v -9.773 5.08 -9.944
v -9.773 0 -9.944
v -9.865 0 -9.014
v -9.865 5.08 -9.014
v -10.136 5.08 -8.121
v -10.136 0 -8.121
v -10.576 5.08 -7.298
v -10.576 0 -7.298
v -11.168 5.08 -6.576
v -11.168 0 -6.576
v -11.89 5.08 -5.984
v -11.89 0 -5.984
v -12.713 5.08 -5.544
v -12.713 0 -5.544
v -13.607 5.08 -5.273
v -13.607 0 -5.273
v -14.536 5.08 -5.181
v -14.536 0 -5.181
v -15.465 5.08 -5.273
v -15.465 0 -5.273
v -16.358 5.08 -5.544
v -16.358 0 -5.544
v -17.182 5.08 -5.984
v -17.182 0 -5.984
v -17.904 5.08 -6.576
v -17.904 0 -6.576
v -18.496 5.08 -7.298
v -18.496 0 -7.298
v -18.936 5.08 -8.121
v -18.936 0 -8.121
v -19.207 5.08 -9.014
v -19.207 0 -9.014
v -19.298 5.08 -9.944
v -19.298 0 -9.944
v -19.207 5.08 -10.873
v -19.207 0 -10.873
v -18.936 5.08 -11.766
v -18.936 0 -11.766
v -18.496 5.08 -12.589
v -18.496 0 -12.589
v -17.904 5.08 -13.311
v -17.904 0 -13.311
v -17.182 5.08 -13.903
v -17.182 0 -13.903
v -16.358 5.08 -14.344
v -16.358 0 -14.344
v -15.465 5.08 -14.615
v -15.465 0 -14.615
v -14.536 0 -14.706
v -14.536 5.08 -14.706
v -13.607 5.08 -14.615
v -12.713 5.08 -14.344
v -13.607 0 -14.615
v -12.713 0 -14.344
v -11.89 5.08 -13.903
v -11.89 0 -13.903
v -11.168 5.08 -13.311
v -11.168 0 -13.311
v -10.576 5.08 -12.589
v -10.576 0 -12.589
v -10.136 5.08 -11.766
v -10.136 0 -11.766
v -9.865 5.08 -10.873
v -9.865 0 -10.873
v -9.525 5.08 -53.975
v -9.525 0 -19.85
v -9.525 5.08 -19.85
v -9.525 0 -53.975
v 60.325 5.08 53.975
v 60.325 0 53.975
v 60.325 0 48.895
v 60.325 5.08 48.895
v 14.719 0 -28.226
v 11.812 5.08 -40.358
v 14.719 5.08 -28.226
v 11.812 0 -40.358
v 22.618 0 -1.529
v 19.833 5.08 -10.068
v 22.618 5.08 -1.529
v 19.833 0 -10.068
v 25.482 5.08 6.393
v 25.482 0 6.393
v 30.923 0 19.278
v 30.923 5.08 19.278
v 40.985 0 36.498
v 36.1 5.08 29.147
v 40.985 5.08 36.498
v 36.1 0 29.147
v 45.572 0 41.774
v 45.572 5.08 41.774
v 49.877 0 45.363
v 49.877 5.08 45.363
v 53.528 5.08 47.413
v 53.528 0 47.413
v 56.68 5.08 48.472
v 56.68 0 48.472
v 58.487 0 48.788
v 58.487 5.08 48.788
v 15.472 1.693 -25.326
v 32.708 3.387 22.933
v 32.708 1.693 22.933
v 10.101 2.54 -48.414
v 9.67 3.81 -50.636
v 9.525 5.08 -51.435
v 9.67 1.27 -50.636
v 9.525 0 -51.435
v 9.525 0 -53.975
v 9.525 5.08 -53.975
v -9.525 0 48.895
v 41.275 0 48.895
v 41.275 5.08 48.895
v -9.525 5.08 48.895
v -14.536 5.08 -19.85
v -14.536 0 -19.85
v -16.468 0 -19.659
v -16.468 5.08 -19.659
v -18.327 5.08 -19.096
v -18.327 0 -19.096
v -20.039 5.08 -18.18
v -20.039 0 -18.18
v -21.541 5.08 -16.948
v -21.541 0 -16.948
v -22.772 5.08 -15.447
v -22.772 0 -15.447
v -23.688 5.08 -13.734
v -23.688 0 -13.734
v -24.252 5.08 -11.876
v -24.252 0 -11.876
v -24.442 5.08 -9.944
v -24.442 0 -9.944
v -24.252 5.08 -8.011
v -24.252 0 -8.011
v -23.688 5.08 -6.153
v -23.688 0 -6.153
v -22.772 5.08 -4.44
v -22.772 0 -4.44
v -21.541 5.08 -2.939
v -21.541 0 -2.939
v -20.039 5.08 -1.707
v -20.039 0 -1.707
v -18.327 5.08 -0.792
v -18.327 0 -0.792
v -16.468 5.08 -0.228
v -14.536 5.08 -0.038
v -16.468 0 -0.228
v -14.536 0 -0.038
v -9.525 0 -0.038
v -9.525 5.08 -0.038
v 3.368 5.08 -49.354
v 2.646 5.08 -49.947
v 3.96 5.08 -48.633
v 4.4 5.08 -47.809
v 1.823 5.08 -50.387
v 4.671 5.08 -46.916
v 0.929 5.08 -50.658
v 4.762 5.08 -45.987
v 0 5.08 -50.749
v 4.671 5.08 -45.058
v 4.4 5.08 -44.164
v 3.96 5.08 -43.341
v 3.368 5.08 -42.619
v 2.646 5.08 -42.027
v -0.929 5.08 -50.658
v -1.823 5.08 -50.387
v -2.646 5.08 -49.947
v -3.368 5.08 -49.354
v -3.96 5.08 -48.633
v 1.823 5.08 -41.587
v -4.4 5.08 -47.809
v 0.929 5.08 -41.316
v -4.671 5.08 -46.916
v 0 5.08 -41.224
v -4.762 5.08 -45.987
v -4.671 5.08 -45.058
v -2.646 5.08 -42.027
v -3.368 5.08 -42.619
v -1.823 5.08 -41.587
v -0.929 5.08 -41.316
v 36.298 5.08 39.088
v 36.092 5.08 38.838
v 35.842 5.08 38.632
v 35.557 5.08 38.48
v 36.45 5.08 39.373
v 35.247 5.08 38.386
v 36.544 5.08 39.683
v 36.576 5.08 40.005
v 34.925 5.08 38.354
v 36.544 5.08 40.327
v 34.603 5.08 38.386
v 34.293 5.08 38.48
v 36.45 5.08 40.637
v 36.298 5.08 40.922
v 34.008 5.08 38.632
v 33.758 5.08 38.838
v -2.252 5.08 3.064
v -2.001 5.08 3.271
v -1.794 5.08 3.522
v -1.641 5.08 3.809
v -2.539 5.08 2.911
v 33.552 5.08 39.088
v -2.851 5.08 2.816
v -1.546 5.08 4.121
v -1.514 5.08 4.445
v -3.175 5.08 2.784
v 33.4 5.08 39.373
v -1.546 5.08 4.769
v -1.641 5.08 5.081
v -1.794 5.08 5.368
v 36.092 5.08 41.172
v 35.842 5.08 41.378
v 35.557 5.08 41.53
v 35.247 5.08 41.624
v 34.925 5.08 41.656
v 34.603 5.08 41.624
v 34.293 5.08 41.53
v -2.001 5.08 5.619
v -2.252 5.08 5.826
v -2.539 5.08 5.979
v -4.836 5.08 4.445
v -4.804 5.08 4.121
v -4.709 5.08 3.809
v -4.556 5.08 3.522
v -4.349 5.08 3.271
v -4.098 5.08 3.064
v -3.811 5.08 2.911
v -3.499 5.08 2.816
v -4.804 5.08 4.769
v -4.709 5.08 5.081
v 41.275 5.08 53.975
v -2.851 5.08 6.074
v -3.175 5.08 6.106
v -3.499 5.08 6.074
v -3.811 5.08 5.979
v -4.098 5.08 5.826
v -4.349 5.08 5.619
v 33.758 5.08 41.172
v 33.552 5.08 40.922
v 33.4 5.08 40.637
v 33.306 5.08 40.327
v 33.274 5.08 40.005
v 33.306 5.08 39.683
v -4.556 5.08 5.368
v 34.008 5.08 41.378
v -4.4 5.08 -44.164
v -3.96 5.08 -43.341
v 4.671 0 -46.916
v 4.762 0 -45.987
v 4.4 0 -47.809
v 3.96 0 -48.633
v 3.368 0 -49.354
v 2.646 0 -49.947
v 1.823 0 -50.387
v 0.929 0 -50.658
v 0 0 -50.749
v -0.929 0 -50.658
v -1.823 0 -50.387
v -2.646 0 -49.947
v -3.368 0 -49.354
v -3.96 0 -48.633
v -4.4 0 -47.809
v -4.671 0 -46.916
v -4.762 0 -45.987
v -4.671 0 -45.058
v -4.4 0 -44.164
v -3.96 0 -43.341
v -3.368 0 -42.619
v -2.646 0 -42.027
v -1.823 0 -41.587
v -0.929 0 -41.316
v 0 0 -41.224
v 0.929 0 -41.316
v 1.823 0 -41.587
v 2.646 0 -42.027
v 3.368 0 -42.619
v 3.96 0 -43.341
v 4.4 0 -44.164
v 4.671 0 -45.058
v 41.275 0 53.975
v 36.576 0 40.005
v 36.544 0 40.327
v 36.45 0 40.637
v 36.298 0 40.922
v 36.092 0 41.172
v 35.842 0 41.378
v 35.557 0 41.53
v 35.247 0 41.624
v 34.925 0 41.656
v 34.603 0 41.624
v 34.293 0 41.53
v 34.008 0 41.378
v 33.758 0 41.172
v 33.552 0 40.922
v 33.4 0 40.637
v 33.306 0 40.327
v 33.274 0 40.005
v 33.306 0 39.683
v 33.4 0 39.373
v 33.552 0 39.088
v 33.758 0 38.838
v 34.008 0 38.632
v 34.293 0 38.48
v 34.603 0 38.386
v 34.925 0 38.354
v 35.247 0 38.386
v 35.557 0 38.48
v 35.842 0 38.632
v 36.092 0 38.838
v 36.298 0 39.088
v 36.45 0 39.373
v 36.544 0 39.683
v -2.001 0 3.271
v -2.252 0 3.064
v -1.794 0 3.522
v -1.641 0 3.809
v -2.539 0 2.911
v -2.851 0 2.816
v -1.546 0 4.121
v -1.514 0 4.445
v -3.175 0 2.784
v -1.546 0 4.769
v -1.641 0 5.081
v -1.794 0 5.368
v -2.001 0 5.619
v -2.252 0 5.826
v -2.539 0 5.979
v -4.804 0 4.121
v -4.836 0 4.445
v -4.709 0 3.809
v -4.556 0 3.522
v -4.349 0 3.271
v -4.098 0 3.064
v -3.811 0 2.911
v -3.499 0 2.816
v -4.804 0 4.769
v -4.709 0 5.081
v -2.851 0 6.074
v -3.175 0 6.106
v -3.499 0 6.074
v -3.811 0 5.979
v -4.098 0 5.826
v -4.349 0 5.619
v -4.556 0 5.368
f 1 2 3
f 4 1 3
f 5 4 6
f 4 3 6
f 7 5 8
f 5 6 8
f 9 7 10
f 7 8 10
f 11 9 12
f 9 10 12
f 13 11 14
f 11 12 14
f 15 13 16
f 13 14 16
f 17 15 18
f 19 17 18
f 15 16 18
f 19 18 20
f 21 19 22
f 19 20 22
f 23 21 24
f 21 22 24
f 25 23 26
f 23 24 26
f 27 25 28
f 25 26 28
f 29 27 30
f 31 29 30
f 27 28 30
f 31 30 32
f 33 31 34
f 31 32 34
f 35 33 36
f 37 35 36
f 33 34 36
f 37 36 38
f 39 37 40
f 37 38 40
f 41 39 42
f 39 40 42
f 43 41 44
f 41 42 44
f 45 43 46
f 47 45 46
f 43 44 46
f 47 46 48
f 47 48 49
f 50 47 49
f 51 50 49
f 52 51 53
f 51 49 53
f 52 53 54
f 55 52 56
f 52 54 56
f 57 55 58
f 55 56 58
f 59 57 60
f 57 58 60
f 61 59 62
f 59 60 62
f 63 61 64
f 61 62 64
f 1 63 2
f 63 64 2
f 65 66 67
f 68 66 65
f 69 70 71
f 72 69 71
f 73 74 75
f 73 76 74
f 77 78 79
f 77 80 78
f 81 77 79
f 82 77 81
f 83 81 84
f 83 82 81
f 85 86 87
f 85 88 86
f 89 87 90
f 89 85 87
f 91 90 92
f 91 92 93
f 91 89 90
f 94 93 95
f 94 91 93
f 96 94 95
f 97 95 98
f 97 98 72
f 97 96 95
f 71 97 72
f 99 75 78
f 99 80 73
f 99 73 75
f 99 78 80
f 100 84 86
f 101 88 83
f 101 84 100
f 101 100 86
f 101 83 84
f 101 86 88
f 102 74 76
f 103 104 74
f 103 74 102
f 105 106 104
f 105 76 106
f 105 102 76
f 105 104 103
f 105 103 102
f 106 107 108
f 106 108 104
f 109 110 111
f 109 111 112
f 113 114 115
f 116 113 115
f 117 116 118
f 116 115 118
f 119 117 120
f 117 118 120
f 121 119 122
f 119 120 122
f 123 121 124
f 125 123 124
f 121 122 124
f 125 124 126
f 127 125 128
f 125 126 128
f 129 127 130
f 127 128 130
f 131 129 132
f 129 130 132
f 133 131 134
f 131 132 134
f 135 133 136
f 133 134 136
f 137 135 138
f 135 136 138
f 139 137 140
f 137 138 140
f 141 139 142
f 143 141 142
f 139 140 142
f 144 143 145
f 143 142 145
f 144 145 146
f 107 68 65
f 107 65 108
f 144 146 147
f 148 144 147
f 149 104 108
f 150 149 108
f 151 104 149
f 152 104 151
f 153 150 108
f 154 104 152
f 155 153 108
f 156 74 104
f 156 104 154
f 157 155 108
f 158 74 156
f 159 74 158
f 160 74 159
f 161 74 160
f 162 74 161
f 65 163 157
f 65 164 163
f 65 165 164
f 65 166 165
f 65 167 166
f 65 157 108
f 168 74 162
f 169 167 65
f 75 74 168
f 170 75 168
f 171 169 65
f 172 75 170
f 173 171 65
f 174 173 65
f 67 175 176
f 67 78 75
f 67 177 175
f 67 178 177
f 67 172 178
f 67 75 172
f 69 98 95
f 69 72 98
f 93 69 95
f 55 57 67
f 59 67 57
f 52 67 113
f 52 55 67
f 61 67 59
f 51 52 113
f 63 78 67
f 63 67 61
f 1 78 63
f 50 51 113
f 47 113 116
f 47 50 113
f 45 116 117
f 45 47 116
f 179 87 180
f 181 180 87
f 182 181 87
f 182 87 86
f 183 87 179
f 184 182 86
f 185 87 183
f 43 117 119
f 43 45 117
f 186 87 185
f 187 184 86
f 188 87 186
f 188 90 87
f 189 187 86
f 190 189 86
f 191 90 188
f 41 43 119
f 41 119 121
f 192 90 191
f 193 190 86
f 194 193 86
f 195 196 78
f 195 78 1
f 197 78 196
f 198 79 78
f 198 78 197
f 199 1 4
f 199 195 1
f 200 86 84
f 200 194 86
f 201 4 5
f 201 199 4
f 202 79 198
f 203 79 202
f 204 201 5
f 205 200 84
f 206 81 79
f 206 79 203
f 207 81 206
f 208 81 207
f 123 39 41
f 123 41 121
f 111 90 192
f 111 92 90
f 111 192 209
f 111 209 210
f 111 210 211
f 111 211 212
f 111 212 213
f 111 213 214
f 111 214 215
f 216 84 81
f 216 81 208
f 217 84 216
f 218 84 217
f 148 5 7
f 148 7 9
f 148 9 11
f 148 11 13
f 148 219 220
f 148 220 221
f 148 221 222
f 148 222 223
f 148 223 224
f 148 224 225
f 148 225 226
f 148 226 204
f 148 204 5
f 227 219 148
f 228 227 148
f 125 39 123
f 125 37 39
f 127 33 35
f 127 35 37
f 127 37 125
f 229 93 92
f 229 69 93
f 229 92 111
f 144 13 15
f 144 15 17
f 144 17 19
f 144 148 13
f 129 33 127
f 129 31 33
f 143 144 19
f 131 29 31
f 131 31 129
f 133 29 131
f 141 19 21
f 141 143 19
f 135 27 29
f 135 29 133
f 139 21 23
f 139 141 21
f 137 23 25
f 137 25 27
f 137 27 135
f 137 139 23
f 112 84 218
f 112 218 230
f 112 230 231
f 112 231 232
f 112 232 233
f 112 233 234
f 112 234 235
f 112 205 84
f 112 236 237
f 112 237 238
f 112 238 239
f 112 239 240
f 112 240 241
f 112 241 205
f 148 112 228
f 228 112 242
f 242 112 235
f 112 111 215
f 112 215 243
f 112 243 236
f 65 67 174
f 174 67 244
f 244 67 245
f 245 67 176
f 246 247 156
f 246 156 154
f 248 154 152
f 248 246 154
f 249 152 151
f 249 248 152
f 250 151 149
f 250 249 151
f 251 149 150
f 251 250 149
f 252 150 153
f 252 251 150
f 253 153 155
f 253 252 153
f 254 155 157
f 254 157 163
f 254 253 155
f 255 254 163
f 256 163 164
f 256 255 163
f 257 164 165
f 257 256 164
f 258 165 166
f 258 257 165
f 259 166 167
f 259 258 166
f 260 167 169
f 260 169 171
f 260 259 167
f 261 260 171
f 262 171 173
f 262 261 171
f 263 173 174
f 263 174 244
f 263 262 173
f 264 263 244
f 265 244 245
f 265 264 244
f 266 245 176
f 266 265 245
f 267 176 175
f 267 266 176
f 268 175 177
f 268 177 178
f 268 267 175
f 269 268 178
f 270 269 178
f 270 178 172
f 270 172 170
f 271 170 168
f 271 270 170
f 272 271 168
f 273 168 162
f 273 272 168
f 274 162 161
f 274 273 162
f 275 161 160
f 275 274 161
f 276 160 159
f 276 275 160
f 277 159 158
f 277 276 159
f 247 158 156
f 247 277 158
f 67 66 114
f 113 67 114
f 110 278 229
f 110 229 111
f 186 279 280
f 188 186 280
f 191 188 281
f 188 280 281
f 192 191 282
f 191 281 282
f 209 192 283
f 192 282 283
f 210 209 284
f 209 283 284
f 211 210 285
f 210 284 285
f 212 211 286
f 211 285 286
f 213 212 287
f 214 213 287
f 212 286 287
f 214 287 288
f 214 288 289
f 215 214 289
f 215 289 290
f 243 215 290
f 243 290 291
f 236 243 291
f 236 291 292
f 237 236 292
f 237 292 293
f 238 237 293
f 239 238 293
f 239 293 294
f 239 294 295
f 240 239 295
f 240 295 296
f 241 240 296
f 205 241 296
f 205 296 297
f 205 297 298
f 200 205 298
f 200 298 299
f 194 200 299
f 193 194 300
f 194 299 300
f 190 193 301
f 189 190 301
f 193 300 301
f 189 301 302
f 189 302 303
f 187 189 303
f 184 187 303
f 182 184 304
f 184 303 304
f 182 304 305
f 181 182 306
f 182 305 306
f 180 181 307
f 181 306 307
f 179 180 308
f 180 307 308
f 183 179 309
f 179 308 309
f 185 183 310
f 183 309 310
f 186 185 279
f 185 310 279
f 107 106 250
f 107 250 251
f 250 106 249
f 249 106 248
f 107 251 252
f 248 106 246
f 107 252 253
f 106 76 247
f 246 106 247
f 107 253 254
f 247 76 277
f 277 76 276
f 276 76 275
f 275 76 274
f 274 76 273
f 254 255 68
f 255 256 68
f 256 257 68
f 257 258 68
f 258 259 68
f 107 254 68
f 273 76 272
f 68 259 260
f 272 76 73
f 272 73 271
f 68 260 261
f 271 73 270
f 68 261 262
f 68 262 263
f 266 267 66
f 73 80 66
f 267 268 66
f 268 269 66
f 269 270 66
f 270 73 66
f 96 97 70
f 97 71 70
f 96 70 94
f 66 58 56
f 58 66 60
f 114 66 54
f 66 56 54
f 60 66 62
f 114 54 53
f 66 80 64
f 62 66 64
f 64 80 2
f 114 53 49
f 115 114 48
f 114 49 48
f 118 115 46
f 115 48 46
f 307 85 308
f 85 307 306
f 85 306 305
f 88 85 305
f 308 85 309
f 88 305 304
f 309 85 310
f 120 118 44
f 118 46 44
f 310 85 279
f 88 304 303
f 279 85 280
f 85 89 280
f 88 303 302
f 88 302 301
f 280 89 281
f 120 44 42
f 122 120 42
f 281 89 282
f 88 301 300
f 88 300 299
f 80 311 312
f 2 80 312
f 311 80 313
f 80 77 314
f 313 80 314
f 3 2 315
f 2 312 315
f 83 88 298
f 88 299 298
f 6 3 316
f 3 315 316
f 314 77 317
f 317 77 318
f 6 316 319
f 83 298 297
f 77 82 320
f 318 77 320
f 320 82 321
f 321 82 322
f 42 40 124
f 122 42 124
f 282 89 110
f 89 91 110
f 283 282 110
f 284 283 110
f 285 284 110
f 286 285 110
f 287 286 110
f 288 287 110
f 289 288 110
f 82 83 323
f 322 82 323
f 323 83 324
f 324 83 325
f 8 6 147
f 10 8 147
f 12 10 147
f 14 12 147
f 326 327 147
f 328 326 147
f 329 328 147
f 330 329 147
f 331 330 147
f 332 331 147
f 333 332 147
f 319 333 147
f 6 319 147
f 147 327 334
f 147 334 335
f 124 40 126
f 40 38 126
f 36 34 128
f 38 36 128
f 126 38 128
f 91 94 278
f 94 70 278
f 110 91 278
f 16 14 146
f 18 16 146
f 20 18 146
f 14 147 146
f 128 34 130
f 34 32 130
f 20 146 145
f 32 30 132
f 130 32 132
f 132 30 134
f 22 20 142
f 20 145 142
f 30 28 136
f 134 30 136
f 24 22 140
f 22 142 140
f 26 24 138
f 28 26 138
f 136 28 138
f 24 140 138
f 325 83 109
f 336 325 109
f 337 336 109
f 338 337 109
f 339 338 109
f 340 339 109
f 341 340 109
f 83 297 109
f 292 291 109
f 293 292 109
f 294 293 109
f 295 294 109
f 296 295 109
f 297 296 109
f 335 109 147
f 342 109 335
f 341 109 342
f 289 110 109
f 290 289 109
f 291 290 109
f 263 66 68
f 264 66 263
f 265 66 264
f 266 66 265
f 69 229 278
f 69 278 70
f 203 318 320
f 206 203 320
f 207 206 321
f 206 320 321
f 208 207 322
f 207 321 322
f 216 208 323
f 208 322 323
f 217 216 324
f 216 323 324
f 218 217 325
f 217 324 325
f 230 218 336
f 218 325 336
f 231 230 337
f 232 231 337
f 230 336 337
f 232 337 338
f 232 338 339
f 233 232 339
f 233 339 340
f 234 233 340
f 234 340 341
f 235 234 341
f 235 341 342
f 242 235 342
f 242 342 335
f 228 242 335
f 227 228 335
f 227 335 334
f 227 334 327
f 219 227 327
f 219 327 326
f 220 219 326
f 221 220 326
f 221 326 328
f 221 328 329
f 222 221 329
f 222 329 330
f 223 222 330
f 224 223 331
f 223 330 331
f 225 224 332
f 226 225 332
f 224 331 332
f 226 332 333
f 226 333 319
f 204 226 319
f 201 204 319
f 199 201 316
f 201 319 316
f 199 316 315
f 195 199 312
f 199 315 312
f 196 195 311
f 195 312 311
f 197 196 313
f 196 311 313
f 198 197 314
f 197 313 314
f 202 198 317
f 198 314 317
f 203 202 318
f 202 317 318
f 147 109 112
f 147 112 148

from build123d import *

# Parameters (mm, degrees)
SKETCH1_R               = 4.7625
BOSS_EXTRUDE1_DEPTH     = 5.08
SKETCH4_W               = 19.05
SKETCH4_H               = 5.08
BOSS_EXTRUDE2_DEPTH     = 5.08
SKETCH5_R               = 1.651
SKETCH5_R_2             = 1.660728382
CUT_EXTRUDE1_DEPTH      = 1.0000001
CUT_EXTRUDE1_DEPTH_BACK = 6.0800001
SKETCH6_R               = 4.7625
BOSS_EXTRUDE3_DEPTH     = 5.08


with BuildPart() as part:
    # Sketch1 → Boss-Extrude1 (new body)
    with BuildSketch(Plane(origin=(0, 0, 0), x_dir=(1, 0, 0), z_dir=(0, 1, 0))):
        with BuildLine():
            Line((-9.525, 53.975), (9.525, 53.975))
            Line((9.525, 53.975), (9.525, 51.435))
            add(Edge.make_bspline(
                [(9.525, 51.435), (9.525, 51.21454564), (27.819109584, -48.895), (60.325, -48.895)],
                knots=[0, 0, 0, 0, 1, 1, 1, 1], degree=3))
            Line((60.325, -48.895), (-9.525, -48.895))
            Line((-9.525, -48.895), (-9.525, 53.975))
        make_face()
        with Locations((0, 45.9867)):
            Circle(SKETCH1_R, mode=Mode.SUBTRACT)
    extrude(amount=BOSS_EXTRUDE1_DEPTH)

    # Sketch4 → Boss-Extrude2 (add)
    with BuildSketch(Plane(origin=(0, 5.08, 0), x_dir=(1, 0, 0), z_dir=(0, 1, 0))):
        with Locations((50.8, -51.435)):
            Rectangle(SKETCH4_W, SKETCH4_H)
    extrude(amount=-BOSS_EXTRUDE2_DEPTH)

    # Sketch5 → Cut-Extrude1 (cut, two sides)
    with BuildSketch(Plane.XZ) as cut_extrude1_sk:
        with Locations((34.925, 40.005)):
            Circle(SKETCH5_R)
        with Locations((-3.175, 4.445)):
            Circle(SKETCH5_R_2)
    extrude(amount=CUT_EXTRUDE1_DEPTH, mode=Mode.SUBTRACT)
    extrude(cut_extrude1_sk.sketch, amount=-CUT_EXTRUDE1_DEPTH_BACK, mode=Mode.SUBTRACT)

    # Sketch6 → Boss-Extrude3 (add)
    with BuildSketch(Plane.XZ):
        with BuildLine():
            Line((-14.535912, -0.037592), (-9.525, -0.037592))
            Line((-9.525, -0.037592), (-9.525, -1.398441508))
            ThreePointArc((-9.525, -1.398441508), (-4.629912, -9.943592), (-9.525, -18.488742492))
            Line((-9.525, -18.488742492), (-9.525, -19.849592))
            Line((-9.525, -19.849592), (-14.535912, -19.849592))
            ThreePointArc((-14.535912, -19.849592), (-24.441912, -9.943592), (-14.535912, -0.037592))
        make_face()
        with Locations((-14.535912, -9.943592)):
            Circle(SKETCH6_R, mode=Mode.SUBTRACT)
    extrude(amount=-BOSS_EXTRUDE3_DEPTH)


solid = part.part
